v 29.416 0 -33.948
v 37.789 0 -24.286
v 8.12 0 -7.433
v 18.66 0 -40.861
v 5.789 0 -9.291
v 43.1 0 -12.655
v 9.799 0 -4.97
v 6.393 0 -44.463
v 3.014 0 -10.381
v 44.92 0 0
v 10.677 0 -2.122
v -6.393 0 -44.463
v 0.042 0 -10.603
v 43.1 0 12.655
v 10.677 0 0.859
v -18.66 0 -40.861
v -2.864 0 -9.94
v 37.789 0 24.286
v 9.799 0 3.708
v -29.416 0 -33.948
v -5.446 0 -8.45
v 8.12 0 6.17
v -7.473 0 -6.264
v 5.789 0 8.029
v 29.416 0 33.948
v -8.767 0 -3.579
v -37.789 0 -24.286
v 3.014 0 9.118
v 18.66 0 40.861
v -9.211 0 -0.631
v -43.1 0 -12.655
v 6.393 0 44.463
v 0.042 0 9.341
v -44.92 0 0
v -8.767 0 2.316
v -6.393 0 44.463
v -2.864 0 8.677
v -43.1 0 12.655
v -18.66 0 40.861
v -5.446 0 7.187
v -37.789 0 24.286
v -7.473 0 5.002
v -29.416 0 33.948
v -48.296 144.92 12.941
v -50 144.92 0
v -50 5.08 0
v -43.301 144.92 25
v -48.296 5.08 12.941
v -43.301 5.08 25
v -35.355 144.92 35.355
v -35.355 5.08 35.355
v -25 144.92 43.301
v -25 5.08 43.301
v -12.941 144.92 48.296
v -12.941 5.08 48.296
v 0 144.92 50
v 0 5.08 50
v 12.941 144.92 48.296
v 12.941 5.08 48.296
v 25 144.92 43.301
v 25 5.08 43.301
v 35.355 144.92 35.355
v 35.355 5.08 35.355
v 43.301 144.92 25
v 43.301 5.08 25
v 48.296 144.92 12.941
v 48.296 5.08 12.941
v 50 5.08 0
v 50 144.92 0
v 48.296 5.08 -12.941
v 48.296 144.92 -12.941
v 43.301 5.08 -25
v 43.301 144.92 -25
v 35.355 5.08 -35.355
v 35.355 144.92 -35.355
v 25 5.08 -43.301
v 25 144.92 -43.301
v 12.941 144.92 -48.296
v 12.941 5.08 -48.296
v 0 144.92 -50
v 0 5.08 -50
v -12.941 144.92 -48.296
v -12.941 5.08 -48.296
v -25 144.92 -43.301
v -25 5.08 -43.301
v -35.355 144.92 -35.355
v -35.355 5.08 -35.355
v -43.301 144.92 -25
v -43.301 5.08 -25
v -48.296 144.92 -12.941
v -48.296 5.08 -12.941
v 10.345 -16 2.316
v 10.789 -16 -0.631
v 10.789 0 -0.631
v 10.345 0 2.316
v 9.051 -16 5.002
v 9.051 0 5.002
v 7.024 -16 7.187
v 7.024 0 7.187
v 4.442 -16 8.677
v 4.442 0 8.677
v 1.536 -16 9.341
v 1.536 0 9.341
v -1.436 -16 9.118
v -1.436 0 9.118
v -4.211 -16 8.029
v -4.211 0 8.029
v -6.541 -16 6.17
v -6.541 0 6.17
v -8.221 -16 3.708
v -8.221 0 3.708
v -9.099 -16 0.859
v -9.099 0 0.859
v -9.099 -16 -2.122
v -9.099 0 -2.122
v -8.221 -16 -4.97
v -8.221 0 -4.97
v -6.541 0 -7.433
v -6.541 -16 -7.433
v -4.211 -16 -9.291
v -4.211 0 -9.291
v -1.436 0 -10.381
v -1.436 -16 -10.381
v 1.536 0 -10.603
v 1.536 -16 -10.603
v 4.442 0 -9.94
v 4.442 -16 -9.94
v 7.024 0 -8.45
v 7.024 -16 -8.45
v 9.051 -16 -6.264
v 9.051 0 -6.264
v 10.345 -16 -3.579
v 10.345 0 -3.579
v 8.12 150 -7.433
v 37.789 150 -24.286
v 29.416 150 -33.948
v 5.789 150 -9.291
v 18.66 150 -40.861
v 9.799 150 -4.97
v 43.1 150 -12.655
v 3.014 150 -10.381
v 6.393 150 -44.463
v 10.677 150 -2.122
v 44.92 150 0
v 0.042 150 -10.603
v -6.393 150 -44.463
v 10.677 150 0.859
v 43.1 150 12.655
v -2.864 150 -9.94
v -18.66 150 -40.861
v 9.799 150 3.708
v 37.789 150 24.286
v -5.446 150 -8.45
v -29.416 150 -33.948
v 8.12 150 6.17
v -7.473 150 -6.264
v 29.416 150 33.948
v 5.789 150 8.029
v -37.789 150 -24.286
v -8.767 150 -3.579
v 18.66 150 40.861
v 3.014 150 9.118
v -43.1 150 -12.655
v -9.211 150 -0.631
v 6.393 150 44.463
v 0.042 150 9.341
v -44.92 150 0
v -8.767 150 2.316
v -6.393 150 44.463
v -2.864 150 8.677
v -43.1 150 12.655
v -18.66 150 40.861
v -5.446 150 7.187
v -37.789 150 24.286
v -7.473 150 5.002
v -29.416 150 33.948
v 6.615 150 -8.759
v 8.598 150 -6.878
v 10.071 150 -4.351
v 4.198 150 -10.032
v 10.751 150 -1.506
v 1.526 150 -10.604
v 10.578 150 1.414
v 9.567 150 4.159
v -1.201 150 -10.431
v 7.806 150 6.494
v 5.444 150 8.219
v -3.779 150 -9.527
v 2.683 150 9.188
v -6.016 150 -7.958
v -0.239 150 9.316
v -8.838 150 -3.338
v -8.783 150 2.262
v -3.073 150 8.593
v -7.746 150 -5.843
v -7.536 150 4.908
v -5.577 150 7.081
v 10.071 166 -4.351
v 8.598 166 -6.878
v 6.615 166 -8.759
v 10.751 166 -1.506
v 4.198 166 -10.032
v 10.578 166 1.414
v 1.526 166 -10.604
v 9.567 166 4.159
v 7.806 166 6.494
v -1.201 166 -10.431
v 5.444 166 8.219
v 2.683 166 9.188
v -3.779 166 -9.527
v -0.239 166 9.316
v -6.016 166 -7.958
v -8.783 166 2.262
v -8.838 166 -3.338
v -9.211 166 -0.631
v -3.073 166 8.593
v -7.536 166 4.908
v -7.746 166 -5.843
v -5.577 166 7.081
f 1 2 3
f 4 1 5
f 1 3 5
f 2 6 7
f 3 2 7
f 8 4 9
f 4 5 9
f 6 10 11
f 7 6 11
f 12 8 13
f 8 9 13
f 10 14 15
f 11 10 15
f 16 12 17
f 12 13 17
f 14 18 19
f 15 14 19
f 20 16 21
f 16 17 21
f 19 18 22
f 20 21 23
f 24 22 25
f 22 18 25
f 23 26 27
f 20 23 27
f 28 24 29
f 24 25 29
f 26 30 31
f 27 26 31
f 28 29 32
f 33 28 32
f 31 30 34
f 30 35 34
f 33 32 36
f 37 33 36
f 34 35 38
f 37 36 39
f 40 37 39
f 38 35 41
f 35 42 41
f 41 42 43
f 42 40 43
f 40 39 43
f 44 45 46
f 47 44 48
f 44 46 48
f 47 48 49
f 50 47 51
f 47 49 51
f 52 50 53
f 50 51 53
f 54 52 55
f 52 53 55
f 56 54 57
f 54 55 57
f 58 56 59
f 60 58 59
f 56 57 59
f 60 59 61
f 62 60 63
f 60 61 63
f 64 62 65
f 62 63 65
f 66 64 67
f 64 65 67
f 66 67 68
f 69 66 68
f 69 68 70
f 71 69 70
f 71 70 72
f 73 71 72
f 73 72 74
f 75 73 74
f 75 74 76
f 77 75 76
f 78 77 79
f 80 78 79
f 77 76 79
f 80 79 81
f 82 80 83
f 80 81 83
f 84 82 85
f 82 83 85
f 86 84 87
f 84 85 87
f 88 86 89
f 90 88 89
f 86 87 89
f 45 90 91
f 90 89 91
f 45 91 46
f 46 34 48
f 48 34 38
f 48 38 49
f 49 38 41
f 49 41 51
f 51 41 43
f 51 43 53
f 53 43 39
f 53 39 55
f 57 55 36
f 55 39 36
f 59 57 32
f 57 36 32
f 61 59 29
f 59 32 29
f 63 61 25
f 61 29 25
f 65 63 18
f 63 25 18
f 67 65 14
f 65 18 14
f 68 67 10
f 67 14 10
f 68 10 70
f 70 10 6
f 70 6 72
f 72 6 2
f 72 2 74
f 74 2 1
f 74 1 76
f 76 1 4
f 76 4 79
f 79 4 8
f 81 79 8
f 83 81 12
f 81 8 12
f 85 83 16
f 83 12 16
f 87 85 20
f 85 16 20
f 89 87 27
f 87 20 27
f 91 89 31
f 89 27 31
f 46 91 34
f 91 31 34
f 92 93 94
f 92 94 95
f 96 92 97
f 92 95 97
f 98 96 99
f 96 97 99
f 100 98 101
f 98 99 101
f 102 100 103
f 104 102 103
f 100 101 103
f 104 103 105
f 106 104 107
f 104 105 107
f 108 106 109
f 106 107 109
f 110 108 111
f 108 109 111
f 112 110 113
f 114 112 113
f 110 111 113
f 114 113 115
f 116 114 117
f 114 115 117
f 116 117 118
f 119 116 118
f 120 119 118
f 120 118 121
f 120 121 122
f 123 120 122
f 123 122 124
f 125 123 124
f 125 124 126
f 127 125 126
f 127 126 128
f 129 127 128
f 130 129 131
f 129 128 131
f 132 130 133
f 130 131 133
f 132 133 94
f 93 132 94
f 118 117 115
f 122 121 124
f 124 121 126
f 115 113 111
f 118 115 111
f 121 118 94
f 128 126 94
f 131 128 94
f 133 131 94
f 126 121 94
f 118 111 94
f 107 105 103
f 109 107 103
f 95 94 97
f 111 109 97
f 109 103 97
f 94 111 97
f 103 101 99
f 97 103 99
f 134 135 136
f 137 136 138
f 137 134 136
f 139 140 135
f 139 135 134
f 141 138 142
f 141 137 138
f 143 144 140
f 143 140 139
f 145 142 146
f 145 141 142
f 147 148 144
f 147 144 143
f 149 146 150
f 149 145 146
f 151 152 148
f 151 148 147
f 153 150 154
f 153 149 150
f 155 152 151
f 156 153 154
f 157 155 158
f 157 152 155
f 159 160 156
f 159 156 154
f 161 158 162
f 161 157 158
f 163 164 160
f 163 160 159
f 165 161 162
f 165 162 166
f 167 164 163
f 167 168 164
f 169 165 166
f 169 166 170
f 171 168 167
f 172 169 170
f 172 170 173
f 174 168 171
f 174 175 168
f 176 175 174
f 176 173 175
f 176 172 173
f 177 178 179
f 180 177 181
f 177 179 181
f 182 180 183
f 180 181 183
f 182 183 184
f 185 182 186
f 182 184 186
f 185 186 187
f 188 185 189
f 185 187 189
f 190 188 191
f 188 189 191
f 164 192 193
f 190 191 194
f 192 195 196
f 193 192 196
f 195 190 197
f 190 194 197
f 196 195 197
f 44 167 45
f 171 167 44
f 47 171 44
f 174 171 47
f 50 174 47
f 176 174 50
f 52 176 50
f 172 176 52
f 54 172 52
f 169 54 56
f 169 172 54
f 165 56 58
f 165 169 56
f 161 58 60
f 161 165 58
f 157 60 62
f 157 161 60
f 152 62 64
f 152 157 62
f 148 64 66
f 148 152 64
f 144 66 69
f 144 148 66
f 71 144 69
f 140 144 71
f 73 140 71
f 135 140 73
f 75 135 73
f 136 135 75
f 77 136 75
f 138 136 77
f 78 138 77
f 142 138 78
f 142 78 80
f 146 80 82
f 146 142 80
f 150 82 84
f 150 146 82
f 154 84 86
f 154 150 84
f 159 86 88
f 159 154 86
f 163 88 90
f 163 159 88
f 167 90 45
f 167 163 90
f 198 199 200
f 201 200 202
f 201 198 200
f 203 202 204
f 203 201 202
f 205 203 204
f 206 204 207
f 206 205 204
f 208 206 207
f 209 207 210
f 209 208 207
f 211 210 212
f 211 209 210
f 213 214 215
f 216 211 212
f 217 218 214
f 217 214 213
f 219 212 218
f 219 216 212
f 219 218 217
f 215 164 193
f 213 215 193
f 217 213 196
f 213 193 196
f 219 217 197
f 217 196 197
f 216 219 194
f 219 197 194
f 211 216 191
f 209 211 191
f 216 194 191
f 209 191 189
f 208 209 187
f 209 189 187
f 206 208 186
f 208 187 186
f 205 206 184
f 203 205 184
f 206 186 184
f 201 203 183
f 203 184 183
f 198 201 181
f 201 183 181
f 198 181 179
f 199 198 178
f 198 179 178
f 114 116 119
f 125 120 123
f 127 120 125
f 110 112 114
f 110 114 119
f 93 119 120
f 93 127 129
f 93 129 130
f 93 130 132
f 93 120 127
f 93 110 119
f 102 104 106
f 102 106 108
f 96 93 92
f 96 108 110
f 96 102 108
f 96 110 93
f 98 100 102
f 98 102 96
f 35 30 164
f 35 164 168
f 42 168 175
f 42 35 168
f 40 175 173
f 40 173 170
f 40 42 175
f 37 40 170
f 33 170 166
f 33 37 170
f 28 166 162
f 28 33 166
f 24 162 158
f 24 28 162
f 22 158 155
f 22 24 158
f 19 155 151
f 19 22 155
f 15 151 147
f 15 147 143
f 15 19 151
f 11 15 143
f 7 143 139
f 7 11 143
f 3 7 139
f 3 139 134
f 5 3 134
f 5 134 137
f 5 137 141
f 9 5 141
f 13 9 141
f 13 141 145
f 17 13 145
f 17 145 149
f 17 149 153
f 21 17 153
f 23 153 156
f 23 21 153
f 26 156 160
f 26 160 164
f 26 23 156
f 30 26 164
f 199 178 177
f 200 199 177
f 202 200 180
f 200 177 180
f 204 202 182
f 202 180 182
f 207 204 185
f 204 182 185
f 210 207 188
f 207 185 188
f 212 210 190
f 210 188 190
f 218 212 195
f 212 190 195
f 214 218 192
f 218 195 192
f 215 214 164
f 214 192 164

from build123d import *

# Parameters (mm, degrees)
F0_R     = 10
F1_DEPTH = 16
F2_R     = 50
F2_R_2   = 10
F3_DEPTH = 150
F6_DEPTH = 16
F7_SIZE  = 5.08


with BuildPart() as f1:
    # F0 (on Front) → F1 (new body)
    with BuildSketch(Plane.XZ):
        with Locations((0.7890519919, -0.6312426412)):
            Circle(F0_R)
    extrude(amount=F1_DEPTH)


with BuildPart() as f3:
    # F2 (on face) → F3 (new body)
    with BuildSketch(Plane(origin=(0, 0, 0), x_dir=(-1, 0, 0), z_dir=(0, 1, 0))):
        Circle(F2_R)
        with Locations((-0.7890519919, -0.6312426412)):
            Circle(F2_R_2, mode=Mode.SUBTRACT)
    extrude(amount=F3_DEPTH)

    # F7
    f7_edges = [f3.edges().sort_by_distance(p)[0] for p in [
        (50, 150, 0),
        (50, 0, 0),
    ]]
    chamfer(f7_edges, length=F7_SIZE)


with BuildPart() as f6:
    # F5 (on face) → F6 (new body)
    with BuildSketch(Plane(origin=(0, 150, 0), x_dir=(-1, 0, 0), z_dir=(0, 1, 0))):
        with BuildLine():
            ThreePointArc((9.2109480081, -0.6312426412), (-4.099125069, 8.8050392655), (-8.5977352367, -6.8781991788))
            ThreePointArc((-8.5977352367, -6.8781991788), (2.5210210852, -10.067524548), (9.2109480081, -0.6312426412))
        make_face()
    extrude(amount=F6_DEPTH)


solid = Compound([f1.part, f3.part, f6.part])
